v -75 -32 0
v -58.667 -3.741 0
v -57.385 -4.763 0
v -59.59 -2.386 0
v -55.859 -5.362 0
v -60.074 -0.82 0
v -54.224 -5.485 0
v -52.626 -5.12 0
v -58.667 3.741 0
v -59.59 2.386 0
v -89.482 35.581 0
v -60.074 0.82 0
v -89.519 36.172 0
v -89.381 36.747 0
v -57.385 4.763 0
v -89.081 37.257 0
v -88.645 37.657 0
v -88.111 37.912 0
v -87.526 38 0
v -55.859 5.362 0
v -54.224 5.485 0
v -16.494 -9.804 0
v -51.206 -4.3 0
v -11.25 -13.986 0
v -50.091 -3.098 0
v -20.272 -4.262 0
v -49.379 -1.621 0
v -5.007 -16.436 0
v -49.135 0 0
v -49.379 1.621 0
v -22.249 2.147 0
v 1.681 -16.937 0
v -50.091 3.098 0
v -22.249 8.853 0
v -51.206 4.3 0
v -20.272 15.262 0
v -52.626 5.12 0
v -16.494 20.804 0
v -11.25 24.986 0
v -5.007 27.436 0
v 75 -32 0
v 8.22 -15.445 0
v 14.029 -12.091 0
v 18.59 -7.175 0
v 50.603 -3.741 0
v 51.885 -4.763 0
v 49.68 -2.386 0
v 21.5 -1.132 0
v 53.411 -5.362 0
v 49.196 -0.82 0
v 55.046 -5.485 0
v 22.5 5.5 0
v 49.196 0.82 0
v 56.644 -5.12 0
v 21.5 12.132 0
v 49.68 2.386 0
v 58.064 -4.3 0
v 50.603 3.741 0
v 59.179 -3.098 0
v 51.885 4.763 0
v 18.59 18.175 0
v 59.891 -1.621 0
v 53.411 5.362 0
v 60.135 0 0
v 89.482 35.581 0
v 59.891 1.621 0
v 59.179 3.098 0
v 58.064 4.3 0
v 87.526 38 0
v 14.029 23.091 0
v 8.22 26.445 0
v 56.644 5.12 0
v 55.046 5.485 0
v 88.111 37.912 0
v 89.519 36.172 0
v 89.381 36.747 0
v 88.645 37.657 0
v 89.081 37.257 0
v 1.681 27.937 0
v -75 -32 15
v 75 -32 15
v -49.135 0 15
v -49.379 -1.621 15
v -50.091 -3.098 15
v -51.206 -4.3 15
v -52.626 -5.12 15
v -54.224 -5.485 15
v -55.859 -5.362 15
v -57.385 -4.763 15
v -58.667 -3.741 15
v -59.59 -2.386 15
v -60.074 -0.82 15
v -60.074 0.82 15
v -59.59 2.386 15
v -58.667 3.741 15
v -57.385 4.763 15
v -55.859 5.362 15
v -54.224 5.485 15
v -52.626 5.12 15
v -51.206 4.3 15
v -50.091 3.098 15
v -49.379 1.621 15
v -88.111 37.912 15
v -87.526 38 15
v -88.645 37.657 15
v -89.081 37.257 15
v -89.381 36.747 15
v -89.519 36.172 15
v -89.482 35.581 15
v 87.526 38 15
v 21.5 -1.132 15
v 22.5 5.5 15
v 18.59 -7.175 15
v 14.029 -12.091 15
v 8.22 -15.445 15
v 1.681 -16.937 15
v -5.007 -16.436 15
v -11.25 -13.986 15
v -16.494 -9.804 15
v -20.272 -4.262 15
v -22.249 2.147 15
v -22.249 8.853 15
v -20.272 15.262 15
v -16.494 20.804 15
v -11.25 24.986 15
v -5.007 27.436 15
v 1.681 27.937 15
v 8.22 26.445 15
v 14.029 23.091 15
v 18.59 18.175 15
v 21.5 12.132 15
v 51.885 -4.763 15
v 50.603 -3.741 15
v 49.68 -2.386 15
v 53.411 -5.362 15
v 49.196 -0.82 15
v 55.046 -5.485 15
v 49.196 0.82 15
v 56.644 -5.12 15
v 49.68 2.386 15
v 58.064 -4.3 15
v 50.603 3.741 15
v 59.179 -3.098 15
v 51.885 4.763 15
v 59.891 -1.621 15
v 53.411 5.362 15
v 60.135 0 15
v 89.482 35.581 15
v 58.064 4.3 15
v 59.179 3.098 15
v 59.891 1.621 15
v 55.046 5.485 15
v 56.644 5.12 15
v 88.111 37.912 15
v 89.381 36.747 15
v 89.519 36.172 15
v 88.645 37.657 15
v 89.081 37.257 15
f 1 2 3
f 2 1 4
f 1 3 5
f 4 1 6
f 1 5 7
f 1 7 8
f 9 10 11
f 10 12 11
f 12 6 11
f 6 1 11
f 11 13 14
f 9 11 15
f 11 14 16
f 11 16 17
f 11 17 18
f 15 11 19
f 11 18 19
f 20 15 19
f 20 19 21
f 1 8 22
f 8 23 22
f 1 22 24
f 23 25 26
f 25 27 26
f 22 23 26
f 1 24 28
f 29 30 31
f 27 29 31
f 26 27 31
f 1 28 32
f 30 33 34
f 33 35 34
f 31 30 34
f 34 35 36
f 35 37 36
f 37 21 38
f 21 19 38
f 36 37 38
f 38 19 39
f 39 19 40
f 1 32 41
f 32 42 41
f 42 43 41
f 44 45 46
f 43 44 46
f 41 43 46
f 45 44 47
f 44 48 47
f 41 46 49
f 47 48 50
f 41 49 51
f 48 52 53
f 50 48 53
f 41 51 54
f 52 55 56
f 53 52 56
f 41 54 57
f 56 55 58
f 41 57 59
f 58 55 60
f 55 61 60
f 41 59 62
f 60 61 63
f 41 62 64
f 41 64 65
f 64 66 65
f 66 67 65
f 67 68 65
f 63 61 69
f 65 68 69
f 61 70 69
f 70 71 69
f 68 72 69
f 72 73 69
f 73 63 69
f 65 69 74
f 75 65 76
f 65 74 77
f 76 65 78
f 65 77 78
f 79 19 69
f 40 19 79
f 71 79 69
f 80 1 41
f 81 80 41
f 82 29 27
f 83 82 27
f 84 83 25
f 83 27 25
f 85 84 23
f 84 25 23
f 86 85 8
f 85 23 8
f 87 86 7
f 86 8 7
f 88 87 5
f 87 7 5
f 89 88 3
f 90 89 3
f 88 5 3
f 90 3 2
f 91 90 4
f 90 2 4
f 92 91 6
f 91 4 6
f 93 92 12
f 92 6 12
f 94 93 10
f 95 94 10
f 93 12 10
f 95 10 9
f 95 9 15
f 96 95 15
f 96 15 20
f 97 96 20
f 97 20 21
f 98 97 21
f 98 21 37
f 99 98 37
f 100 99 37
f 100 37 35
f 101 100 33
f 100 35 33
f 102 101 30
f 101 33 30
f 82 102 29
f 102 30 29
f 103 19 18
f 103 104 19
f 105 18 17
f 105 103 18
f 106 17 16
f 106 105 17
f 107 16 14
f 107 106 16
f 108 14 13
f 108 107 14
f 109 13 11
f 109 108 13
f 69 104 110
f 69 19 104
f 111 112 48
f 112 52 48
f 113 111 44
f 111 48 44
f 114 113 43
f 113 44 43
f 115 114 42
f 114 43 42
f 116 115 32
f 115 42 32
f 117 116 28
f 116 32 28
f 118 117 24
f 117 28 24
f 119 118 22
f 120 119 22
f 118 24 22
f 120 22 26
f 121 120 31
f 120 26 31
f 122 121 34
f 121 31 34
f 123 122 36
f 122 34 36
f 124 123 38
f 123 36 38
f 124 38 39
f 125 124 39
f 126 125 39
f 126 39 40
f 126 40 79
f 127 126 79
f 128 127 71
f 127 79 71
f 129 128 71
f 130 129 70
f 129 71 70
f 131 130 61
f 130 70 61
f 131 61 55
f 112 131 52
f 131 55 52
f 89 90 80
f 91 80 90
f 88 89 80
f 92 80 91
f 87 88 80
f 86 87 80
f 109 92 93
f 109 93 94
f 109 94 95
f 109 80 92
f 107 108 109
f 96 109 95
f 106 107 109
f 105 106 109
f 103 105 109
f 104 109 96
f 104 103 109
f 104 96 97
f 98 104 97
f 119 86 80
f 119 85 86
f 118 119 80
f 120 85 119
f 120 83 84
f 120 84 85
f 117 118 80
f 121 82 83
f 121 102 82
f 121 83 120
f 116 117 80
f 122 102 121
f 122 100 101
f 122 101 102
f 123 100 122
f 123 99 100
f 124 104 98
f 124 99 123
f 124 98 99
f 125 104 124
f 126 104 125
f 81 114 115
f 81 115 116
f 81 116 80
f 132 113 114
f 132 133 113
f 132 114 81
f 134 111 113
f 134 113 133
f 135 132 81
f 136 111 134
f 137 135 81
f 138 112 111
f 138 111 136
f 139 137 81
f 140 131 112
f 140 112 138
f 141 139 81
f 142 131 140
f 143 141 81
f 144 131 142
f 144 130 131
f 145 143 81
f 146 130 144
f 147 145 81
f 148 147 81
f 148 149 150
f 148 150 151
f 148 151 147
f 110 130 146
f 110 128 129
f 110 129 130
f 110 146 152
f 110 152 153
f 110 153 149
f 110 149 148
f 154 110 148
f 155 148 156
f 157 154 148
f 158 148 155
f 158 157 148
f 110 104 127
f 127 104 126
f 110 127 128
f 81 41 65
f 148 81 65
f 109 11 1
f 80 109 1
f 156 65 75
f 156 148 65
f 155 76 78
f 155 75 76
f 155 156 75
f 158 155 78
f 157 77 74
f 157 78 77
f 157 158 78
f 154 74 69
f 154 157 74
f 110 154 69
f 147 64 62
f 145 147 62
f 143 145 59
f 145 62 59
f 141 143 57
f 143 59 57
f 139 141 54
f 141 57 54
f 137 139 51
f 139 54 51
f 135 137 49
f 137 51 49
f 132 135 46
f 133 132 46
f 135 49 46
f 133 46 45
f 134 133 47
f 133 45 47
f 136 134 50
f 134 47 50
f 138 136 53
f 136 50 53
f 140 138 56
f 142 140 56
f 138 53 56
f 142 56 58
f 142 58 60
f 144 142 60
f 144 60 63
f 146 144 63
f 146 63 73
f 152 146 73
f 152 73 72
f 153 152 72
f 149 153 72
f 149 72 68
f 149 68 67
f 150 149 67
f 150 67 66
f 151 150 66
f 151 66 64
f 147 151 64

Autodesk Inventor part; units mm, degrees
ref_plane "YZ Plane" through (0, 0, 0) normal (1, 0, 0) x (0, 1, 0)
ref_plane "XZ Plane" through (0, 0, 0) normal (0, 1, 0) x (-1, 0, 0)
ref_plane "XY Plane" through (0, 0, 0) normal (0, 0, 1) x (1, 0, 0)
sketch "hole pattern" plane through (0, 0, 0) normal (0, 0, 1) x (1, 0, 0)
  circle A0 centre (-54.635, 0) radius 5 construction
  line L0 (-126, 0) -> (126, 0) projected
  line L1 (0, -46) -> (0, 52) projected
  circle A1 centre (0, 5.5) radius 22.5
  line L2 (-54.635, -5) -> (0, -5) construction
  circle A2 centre (54.635, 0) radius 5 construction
  line L3 (-90, 38) -> (90, 38)
  line L4 (-90, 38) -> (-75, -32)
  line L5 (-75, -32) -> (75, -32)
  line L6 (75, -32) -> (90, 38)
  circle A3 centre (-54.635, 0) radius 15 construction
  circle A4 centre (54.635, 0) radius 15 construction
  circle A5 centre (-54.635, 0) radius 5.5
  circle A6 centre (54.635, 0) radius 5.5
  point P0 (0, 0)
  dimension "d1" = 10
  dimension "d0" = 54.635
  dimension "d2" = 45
  dimension "topWidth" = 180
  dimension "d38" = 90
  dimension "d39" = 32.5
  dimension "d40" = 10.5
  dimension "d41" = 32
  dimension "d42" = 30
  dimension "d43" = 30
  dimension "d44" = 11
  dimension "d45" = 11
  dimension "d76" = 150
extrude "Extrusion1" add sketch "hole pattern" along normal blind 15 contours L4 L3 L1 A1 L0 A5 | L0 A5 A1 L1 L5 L4 | L3 L6 L0 A6 A1 L1 | L1 A1 L0 A6 L6 L5
fillet "Fillet1" radius 2 2 edges at (-90, 38, 7.5) (90, 38, 7.5)
equation "\"d38\" = 0.5 * topWidth"
properties part number "Brake_Light_Base_Plate"
